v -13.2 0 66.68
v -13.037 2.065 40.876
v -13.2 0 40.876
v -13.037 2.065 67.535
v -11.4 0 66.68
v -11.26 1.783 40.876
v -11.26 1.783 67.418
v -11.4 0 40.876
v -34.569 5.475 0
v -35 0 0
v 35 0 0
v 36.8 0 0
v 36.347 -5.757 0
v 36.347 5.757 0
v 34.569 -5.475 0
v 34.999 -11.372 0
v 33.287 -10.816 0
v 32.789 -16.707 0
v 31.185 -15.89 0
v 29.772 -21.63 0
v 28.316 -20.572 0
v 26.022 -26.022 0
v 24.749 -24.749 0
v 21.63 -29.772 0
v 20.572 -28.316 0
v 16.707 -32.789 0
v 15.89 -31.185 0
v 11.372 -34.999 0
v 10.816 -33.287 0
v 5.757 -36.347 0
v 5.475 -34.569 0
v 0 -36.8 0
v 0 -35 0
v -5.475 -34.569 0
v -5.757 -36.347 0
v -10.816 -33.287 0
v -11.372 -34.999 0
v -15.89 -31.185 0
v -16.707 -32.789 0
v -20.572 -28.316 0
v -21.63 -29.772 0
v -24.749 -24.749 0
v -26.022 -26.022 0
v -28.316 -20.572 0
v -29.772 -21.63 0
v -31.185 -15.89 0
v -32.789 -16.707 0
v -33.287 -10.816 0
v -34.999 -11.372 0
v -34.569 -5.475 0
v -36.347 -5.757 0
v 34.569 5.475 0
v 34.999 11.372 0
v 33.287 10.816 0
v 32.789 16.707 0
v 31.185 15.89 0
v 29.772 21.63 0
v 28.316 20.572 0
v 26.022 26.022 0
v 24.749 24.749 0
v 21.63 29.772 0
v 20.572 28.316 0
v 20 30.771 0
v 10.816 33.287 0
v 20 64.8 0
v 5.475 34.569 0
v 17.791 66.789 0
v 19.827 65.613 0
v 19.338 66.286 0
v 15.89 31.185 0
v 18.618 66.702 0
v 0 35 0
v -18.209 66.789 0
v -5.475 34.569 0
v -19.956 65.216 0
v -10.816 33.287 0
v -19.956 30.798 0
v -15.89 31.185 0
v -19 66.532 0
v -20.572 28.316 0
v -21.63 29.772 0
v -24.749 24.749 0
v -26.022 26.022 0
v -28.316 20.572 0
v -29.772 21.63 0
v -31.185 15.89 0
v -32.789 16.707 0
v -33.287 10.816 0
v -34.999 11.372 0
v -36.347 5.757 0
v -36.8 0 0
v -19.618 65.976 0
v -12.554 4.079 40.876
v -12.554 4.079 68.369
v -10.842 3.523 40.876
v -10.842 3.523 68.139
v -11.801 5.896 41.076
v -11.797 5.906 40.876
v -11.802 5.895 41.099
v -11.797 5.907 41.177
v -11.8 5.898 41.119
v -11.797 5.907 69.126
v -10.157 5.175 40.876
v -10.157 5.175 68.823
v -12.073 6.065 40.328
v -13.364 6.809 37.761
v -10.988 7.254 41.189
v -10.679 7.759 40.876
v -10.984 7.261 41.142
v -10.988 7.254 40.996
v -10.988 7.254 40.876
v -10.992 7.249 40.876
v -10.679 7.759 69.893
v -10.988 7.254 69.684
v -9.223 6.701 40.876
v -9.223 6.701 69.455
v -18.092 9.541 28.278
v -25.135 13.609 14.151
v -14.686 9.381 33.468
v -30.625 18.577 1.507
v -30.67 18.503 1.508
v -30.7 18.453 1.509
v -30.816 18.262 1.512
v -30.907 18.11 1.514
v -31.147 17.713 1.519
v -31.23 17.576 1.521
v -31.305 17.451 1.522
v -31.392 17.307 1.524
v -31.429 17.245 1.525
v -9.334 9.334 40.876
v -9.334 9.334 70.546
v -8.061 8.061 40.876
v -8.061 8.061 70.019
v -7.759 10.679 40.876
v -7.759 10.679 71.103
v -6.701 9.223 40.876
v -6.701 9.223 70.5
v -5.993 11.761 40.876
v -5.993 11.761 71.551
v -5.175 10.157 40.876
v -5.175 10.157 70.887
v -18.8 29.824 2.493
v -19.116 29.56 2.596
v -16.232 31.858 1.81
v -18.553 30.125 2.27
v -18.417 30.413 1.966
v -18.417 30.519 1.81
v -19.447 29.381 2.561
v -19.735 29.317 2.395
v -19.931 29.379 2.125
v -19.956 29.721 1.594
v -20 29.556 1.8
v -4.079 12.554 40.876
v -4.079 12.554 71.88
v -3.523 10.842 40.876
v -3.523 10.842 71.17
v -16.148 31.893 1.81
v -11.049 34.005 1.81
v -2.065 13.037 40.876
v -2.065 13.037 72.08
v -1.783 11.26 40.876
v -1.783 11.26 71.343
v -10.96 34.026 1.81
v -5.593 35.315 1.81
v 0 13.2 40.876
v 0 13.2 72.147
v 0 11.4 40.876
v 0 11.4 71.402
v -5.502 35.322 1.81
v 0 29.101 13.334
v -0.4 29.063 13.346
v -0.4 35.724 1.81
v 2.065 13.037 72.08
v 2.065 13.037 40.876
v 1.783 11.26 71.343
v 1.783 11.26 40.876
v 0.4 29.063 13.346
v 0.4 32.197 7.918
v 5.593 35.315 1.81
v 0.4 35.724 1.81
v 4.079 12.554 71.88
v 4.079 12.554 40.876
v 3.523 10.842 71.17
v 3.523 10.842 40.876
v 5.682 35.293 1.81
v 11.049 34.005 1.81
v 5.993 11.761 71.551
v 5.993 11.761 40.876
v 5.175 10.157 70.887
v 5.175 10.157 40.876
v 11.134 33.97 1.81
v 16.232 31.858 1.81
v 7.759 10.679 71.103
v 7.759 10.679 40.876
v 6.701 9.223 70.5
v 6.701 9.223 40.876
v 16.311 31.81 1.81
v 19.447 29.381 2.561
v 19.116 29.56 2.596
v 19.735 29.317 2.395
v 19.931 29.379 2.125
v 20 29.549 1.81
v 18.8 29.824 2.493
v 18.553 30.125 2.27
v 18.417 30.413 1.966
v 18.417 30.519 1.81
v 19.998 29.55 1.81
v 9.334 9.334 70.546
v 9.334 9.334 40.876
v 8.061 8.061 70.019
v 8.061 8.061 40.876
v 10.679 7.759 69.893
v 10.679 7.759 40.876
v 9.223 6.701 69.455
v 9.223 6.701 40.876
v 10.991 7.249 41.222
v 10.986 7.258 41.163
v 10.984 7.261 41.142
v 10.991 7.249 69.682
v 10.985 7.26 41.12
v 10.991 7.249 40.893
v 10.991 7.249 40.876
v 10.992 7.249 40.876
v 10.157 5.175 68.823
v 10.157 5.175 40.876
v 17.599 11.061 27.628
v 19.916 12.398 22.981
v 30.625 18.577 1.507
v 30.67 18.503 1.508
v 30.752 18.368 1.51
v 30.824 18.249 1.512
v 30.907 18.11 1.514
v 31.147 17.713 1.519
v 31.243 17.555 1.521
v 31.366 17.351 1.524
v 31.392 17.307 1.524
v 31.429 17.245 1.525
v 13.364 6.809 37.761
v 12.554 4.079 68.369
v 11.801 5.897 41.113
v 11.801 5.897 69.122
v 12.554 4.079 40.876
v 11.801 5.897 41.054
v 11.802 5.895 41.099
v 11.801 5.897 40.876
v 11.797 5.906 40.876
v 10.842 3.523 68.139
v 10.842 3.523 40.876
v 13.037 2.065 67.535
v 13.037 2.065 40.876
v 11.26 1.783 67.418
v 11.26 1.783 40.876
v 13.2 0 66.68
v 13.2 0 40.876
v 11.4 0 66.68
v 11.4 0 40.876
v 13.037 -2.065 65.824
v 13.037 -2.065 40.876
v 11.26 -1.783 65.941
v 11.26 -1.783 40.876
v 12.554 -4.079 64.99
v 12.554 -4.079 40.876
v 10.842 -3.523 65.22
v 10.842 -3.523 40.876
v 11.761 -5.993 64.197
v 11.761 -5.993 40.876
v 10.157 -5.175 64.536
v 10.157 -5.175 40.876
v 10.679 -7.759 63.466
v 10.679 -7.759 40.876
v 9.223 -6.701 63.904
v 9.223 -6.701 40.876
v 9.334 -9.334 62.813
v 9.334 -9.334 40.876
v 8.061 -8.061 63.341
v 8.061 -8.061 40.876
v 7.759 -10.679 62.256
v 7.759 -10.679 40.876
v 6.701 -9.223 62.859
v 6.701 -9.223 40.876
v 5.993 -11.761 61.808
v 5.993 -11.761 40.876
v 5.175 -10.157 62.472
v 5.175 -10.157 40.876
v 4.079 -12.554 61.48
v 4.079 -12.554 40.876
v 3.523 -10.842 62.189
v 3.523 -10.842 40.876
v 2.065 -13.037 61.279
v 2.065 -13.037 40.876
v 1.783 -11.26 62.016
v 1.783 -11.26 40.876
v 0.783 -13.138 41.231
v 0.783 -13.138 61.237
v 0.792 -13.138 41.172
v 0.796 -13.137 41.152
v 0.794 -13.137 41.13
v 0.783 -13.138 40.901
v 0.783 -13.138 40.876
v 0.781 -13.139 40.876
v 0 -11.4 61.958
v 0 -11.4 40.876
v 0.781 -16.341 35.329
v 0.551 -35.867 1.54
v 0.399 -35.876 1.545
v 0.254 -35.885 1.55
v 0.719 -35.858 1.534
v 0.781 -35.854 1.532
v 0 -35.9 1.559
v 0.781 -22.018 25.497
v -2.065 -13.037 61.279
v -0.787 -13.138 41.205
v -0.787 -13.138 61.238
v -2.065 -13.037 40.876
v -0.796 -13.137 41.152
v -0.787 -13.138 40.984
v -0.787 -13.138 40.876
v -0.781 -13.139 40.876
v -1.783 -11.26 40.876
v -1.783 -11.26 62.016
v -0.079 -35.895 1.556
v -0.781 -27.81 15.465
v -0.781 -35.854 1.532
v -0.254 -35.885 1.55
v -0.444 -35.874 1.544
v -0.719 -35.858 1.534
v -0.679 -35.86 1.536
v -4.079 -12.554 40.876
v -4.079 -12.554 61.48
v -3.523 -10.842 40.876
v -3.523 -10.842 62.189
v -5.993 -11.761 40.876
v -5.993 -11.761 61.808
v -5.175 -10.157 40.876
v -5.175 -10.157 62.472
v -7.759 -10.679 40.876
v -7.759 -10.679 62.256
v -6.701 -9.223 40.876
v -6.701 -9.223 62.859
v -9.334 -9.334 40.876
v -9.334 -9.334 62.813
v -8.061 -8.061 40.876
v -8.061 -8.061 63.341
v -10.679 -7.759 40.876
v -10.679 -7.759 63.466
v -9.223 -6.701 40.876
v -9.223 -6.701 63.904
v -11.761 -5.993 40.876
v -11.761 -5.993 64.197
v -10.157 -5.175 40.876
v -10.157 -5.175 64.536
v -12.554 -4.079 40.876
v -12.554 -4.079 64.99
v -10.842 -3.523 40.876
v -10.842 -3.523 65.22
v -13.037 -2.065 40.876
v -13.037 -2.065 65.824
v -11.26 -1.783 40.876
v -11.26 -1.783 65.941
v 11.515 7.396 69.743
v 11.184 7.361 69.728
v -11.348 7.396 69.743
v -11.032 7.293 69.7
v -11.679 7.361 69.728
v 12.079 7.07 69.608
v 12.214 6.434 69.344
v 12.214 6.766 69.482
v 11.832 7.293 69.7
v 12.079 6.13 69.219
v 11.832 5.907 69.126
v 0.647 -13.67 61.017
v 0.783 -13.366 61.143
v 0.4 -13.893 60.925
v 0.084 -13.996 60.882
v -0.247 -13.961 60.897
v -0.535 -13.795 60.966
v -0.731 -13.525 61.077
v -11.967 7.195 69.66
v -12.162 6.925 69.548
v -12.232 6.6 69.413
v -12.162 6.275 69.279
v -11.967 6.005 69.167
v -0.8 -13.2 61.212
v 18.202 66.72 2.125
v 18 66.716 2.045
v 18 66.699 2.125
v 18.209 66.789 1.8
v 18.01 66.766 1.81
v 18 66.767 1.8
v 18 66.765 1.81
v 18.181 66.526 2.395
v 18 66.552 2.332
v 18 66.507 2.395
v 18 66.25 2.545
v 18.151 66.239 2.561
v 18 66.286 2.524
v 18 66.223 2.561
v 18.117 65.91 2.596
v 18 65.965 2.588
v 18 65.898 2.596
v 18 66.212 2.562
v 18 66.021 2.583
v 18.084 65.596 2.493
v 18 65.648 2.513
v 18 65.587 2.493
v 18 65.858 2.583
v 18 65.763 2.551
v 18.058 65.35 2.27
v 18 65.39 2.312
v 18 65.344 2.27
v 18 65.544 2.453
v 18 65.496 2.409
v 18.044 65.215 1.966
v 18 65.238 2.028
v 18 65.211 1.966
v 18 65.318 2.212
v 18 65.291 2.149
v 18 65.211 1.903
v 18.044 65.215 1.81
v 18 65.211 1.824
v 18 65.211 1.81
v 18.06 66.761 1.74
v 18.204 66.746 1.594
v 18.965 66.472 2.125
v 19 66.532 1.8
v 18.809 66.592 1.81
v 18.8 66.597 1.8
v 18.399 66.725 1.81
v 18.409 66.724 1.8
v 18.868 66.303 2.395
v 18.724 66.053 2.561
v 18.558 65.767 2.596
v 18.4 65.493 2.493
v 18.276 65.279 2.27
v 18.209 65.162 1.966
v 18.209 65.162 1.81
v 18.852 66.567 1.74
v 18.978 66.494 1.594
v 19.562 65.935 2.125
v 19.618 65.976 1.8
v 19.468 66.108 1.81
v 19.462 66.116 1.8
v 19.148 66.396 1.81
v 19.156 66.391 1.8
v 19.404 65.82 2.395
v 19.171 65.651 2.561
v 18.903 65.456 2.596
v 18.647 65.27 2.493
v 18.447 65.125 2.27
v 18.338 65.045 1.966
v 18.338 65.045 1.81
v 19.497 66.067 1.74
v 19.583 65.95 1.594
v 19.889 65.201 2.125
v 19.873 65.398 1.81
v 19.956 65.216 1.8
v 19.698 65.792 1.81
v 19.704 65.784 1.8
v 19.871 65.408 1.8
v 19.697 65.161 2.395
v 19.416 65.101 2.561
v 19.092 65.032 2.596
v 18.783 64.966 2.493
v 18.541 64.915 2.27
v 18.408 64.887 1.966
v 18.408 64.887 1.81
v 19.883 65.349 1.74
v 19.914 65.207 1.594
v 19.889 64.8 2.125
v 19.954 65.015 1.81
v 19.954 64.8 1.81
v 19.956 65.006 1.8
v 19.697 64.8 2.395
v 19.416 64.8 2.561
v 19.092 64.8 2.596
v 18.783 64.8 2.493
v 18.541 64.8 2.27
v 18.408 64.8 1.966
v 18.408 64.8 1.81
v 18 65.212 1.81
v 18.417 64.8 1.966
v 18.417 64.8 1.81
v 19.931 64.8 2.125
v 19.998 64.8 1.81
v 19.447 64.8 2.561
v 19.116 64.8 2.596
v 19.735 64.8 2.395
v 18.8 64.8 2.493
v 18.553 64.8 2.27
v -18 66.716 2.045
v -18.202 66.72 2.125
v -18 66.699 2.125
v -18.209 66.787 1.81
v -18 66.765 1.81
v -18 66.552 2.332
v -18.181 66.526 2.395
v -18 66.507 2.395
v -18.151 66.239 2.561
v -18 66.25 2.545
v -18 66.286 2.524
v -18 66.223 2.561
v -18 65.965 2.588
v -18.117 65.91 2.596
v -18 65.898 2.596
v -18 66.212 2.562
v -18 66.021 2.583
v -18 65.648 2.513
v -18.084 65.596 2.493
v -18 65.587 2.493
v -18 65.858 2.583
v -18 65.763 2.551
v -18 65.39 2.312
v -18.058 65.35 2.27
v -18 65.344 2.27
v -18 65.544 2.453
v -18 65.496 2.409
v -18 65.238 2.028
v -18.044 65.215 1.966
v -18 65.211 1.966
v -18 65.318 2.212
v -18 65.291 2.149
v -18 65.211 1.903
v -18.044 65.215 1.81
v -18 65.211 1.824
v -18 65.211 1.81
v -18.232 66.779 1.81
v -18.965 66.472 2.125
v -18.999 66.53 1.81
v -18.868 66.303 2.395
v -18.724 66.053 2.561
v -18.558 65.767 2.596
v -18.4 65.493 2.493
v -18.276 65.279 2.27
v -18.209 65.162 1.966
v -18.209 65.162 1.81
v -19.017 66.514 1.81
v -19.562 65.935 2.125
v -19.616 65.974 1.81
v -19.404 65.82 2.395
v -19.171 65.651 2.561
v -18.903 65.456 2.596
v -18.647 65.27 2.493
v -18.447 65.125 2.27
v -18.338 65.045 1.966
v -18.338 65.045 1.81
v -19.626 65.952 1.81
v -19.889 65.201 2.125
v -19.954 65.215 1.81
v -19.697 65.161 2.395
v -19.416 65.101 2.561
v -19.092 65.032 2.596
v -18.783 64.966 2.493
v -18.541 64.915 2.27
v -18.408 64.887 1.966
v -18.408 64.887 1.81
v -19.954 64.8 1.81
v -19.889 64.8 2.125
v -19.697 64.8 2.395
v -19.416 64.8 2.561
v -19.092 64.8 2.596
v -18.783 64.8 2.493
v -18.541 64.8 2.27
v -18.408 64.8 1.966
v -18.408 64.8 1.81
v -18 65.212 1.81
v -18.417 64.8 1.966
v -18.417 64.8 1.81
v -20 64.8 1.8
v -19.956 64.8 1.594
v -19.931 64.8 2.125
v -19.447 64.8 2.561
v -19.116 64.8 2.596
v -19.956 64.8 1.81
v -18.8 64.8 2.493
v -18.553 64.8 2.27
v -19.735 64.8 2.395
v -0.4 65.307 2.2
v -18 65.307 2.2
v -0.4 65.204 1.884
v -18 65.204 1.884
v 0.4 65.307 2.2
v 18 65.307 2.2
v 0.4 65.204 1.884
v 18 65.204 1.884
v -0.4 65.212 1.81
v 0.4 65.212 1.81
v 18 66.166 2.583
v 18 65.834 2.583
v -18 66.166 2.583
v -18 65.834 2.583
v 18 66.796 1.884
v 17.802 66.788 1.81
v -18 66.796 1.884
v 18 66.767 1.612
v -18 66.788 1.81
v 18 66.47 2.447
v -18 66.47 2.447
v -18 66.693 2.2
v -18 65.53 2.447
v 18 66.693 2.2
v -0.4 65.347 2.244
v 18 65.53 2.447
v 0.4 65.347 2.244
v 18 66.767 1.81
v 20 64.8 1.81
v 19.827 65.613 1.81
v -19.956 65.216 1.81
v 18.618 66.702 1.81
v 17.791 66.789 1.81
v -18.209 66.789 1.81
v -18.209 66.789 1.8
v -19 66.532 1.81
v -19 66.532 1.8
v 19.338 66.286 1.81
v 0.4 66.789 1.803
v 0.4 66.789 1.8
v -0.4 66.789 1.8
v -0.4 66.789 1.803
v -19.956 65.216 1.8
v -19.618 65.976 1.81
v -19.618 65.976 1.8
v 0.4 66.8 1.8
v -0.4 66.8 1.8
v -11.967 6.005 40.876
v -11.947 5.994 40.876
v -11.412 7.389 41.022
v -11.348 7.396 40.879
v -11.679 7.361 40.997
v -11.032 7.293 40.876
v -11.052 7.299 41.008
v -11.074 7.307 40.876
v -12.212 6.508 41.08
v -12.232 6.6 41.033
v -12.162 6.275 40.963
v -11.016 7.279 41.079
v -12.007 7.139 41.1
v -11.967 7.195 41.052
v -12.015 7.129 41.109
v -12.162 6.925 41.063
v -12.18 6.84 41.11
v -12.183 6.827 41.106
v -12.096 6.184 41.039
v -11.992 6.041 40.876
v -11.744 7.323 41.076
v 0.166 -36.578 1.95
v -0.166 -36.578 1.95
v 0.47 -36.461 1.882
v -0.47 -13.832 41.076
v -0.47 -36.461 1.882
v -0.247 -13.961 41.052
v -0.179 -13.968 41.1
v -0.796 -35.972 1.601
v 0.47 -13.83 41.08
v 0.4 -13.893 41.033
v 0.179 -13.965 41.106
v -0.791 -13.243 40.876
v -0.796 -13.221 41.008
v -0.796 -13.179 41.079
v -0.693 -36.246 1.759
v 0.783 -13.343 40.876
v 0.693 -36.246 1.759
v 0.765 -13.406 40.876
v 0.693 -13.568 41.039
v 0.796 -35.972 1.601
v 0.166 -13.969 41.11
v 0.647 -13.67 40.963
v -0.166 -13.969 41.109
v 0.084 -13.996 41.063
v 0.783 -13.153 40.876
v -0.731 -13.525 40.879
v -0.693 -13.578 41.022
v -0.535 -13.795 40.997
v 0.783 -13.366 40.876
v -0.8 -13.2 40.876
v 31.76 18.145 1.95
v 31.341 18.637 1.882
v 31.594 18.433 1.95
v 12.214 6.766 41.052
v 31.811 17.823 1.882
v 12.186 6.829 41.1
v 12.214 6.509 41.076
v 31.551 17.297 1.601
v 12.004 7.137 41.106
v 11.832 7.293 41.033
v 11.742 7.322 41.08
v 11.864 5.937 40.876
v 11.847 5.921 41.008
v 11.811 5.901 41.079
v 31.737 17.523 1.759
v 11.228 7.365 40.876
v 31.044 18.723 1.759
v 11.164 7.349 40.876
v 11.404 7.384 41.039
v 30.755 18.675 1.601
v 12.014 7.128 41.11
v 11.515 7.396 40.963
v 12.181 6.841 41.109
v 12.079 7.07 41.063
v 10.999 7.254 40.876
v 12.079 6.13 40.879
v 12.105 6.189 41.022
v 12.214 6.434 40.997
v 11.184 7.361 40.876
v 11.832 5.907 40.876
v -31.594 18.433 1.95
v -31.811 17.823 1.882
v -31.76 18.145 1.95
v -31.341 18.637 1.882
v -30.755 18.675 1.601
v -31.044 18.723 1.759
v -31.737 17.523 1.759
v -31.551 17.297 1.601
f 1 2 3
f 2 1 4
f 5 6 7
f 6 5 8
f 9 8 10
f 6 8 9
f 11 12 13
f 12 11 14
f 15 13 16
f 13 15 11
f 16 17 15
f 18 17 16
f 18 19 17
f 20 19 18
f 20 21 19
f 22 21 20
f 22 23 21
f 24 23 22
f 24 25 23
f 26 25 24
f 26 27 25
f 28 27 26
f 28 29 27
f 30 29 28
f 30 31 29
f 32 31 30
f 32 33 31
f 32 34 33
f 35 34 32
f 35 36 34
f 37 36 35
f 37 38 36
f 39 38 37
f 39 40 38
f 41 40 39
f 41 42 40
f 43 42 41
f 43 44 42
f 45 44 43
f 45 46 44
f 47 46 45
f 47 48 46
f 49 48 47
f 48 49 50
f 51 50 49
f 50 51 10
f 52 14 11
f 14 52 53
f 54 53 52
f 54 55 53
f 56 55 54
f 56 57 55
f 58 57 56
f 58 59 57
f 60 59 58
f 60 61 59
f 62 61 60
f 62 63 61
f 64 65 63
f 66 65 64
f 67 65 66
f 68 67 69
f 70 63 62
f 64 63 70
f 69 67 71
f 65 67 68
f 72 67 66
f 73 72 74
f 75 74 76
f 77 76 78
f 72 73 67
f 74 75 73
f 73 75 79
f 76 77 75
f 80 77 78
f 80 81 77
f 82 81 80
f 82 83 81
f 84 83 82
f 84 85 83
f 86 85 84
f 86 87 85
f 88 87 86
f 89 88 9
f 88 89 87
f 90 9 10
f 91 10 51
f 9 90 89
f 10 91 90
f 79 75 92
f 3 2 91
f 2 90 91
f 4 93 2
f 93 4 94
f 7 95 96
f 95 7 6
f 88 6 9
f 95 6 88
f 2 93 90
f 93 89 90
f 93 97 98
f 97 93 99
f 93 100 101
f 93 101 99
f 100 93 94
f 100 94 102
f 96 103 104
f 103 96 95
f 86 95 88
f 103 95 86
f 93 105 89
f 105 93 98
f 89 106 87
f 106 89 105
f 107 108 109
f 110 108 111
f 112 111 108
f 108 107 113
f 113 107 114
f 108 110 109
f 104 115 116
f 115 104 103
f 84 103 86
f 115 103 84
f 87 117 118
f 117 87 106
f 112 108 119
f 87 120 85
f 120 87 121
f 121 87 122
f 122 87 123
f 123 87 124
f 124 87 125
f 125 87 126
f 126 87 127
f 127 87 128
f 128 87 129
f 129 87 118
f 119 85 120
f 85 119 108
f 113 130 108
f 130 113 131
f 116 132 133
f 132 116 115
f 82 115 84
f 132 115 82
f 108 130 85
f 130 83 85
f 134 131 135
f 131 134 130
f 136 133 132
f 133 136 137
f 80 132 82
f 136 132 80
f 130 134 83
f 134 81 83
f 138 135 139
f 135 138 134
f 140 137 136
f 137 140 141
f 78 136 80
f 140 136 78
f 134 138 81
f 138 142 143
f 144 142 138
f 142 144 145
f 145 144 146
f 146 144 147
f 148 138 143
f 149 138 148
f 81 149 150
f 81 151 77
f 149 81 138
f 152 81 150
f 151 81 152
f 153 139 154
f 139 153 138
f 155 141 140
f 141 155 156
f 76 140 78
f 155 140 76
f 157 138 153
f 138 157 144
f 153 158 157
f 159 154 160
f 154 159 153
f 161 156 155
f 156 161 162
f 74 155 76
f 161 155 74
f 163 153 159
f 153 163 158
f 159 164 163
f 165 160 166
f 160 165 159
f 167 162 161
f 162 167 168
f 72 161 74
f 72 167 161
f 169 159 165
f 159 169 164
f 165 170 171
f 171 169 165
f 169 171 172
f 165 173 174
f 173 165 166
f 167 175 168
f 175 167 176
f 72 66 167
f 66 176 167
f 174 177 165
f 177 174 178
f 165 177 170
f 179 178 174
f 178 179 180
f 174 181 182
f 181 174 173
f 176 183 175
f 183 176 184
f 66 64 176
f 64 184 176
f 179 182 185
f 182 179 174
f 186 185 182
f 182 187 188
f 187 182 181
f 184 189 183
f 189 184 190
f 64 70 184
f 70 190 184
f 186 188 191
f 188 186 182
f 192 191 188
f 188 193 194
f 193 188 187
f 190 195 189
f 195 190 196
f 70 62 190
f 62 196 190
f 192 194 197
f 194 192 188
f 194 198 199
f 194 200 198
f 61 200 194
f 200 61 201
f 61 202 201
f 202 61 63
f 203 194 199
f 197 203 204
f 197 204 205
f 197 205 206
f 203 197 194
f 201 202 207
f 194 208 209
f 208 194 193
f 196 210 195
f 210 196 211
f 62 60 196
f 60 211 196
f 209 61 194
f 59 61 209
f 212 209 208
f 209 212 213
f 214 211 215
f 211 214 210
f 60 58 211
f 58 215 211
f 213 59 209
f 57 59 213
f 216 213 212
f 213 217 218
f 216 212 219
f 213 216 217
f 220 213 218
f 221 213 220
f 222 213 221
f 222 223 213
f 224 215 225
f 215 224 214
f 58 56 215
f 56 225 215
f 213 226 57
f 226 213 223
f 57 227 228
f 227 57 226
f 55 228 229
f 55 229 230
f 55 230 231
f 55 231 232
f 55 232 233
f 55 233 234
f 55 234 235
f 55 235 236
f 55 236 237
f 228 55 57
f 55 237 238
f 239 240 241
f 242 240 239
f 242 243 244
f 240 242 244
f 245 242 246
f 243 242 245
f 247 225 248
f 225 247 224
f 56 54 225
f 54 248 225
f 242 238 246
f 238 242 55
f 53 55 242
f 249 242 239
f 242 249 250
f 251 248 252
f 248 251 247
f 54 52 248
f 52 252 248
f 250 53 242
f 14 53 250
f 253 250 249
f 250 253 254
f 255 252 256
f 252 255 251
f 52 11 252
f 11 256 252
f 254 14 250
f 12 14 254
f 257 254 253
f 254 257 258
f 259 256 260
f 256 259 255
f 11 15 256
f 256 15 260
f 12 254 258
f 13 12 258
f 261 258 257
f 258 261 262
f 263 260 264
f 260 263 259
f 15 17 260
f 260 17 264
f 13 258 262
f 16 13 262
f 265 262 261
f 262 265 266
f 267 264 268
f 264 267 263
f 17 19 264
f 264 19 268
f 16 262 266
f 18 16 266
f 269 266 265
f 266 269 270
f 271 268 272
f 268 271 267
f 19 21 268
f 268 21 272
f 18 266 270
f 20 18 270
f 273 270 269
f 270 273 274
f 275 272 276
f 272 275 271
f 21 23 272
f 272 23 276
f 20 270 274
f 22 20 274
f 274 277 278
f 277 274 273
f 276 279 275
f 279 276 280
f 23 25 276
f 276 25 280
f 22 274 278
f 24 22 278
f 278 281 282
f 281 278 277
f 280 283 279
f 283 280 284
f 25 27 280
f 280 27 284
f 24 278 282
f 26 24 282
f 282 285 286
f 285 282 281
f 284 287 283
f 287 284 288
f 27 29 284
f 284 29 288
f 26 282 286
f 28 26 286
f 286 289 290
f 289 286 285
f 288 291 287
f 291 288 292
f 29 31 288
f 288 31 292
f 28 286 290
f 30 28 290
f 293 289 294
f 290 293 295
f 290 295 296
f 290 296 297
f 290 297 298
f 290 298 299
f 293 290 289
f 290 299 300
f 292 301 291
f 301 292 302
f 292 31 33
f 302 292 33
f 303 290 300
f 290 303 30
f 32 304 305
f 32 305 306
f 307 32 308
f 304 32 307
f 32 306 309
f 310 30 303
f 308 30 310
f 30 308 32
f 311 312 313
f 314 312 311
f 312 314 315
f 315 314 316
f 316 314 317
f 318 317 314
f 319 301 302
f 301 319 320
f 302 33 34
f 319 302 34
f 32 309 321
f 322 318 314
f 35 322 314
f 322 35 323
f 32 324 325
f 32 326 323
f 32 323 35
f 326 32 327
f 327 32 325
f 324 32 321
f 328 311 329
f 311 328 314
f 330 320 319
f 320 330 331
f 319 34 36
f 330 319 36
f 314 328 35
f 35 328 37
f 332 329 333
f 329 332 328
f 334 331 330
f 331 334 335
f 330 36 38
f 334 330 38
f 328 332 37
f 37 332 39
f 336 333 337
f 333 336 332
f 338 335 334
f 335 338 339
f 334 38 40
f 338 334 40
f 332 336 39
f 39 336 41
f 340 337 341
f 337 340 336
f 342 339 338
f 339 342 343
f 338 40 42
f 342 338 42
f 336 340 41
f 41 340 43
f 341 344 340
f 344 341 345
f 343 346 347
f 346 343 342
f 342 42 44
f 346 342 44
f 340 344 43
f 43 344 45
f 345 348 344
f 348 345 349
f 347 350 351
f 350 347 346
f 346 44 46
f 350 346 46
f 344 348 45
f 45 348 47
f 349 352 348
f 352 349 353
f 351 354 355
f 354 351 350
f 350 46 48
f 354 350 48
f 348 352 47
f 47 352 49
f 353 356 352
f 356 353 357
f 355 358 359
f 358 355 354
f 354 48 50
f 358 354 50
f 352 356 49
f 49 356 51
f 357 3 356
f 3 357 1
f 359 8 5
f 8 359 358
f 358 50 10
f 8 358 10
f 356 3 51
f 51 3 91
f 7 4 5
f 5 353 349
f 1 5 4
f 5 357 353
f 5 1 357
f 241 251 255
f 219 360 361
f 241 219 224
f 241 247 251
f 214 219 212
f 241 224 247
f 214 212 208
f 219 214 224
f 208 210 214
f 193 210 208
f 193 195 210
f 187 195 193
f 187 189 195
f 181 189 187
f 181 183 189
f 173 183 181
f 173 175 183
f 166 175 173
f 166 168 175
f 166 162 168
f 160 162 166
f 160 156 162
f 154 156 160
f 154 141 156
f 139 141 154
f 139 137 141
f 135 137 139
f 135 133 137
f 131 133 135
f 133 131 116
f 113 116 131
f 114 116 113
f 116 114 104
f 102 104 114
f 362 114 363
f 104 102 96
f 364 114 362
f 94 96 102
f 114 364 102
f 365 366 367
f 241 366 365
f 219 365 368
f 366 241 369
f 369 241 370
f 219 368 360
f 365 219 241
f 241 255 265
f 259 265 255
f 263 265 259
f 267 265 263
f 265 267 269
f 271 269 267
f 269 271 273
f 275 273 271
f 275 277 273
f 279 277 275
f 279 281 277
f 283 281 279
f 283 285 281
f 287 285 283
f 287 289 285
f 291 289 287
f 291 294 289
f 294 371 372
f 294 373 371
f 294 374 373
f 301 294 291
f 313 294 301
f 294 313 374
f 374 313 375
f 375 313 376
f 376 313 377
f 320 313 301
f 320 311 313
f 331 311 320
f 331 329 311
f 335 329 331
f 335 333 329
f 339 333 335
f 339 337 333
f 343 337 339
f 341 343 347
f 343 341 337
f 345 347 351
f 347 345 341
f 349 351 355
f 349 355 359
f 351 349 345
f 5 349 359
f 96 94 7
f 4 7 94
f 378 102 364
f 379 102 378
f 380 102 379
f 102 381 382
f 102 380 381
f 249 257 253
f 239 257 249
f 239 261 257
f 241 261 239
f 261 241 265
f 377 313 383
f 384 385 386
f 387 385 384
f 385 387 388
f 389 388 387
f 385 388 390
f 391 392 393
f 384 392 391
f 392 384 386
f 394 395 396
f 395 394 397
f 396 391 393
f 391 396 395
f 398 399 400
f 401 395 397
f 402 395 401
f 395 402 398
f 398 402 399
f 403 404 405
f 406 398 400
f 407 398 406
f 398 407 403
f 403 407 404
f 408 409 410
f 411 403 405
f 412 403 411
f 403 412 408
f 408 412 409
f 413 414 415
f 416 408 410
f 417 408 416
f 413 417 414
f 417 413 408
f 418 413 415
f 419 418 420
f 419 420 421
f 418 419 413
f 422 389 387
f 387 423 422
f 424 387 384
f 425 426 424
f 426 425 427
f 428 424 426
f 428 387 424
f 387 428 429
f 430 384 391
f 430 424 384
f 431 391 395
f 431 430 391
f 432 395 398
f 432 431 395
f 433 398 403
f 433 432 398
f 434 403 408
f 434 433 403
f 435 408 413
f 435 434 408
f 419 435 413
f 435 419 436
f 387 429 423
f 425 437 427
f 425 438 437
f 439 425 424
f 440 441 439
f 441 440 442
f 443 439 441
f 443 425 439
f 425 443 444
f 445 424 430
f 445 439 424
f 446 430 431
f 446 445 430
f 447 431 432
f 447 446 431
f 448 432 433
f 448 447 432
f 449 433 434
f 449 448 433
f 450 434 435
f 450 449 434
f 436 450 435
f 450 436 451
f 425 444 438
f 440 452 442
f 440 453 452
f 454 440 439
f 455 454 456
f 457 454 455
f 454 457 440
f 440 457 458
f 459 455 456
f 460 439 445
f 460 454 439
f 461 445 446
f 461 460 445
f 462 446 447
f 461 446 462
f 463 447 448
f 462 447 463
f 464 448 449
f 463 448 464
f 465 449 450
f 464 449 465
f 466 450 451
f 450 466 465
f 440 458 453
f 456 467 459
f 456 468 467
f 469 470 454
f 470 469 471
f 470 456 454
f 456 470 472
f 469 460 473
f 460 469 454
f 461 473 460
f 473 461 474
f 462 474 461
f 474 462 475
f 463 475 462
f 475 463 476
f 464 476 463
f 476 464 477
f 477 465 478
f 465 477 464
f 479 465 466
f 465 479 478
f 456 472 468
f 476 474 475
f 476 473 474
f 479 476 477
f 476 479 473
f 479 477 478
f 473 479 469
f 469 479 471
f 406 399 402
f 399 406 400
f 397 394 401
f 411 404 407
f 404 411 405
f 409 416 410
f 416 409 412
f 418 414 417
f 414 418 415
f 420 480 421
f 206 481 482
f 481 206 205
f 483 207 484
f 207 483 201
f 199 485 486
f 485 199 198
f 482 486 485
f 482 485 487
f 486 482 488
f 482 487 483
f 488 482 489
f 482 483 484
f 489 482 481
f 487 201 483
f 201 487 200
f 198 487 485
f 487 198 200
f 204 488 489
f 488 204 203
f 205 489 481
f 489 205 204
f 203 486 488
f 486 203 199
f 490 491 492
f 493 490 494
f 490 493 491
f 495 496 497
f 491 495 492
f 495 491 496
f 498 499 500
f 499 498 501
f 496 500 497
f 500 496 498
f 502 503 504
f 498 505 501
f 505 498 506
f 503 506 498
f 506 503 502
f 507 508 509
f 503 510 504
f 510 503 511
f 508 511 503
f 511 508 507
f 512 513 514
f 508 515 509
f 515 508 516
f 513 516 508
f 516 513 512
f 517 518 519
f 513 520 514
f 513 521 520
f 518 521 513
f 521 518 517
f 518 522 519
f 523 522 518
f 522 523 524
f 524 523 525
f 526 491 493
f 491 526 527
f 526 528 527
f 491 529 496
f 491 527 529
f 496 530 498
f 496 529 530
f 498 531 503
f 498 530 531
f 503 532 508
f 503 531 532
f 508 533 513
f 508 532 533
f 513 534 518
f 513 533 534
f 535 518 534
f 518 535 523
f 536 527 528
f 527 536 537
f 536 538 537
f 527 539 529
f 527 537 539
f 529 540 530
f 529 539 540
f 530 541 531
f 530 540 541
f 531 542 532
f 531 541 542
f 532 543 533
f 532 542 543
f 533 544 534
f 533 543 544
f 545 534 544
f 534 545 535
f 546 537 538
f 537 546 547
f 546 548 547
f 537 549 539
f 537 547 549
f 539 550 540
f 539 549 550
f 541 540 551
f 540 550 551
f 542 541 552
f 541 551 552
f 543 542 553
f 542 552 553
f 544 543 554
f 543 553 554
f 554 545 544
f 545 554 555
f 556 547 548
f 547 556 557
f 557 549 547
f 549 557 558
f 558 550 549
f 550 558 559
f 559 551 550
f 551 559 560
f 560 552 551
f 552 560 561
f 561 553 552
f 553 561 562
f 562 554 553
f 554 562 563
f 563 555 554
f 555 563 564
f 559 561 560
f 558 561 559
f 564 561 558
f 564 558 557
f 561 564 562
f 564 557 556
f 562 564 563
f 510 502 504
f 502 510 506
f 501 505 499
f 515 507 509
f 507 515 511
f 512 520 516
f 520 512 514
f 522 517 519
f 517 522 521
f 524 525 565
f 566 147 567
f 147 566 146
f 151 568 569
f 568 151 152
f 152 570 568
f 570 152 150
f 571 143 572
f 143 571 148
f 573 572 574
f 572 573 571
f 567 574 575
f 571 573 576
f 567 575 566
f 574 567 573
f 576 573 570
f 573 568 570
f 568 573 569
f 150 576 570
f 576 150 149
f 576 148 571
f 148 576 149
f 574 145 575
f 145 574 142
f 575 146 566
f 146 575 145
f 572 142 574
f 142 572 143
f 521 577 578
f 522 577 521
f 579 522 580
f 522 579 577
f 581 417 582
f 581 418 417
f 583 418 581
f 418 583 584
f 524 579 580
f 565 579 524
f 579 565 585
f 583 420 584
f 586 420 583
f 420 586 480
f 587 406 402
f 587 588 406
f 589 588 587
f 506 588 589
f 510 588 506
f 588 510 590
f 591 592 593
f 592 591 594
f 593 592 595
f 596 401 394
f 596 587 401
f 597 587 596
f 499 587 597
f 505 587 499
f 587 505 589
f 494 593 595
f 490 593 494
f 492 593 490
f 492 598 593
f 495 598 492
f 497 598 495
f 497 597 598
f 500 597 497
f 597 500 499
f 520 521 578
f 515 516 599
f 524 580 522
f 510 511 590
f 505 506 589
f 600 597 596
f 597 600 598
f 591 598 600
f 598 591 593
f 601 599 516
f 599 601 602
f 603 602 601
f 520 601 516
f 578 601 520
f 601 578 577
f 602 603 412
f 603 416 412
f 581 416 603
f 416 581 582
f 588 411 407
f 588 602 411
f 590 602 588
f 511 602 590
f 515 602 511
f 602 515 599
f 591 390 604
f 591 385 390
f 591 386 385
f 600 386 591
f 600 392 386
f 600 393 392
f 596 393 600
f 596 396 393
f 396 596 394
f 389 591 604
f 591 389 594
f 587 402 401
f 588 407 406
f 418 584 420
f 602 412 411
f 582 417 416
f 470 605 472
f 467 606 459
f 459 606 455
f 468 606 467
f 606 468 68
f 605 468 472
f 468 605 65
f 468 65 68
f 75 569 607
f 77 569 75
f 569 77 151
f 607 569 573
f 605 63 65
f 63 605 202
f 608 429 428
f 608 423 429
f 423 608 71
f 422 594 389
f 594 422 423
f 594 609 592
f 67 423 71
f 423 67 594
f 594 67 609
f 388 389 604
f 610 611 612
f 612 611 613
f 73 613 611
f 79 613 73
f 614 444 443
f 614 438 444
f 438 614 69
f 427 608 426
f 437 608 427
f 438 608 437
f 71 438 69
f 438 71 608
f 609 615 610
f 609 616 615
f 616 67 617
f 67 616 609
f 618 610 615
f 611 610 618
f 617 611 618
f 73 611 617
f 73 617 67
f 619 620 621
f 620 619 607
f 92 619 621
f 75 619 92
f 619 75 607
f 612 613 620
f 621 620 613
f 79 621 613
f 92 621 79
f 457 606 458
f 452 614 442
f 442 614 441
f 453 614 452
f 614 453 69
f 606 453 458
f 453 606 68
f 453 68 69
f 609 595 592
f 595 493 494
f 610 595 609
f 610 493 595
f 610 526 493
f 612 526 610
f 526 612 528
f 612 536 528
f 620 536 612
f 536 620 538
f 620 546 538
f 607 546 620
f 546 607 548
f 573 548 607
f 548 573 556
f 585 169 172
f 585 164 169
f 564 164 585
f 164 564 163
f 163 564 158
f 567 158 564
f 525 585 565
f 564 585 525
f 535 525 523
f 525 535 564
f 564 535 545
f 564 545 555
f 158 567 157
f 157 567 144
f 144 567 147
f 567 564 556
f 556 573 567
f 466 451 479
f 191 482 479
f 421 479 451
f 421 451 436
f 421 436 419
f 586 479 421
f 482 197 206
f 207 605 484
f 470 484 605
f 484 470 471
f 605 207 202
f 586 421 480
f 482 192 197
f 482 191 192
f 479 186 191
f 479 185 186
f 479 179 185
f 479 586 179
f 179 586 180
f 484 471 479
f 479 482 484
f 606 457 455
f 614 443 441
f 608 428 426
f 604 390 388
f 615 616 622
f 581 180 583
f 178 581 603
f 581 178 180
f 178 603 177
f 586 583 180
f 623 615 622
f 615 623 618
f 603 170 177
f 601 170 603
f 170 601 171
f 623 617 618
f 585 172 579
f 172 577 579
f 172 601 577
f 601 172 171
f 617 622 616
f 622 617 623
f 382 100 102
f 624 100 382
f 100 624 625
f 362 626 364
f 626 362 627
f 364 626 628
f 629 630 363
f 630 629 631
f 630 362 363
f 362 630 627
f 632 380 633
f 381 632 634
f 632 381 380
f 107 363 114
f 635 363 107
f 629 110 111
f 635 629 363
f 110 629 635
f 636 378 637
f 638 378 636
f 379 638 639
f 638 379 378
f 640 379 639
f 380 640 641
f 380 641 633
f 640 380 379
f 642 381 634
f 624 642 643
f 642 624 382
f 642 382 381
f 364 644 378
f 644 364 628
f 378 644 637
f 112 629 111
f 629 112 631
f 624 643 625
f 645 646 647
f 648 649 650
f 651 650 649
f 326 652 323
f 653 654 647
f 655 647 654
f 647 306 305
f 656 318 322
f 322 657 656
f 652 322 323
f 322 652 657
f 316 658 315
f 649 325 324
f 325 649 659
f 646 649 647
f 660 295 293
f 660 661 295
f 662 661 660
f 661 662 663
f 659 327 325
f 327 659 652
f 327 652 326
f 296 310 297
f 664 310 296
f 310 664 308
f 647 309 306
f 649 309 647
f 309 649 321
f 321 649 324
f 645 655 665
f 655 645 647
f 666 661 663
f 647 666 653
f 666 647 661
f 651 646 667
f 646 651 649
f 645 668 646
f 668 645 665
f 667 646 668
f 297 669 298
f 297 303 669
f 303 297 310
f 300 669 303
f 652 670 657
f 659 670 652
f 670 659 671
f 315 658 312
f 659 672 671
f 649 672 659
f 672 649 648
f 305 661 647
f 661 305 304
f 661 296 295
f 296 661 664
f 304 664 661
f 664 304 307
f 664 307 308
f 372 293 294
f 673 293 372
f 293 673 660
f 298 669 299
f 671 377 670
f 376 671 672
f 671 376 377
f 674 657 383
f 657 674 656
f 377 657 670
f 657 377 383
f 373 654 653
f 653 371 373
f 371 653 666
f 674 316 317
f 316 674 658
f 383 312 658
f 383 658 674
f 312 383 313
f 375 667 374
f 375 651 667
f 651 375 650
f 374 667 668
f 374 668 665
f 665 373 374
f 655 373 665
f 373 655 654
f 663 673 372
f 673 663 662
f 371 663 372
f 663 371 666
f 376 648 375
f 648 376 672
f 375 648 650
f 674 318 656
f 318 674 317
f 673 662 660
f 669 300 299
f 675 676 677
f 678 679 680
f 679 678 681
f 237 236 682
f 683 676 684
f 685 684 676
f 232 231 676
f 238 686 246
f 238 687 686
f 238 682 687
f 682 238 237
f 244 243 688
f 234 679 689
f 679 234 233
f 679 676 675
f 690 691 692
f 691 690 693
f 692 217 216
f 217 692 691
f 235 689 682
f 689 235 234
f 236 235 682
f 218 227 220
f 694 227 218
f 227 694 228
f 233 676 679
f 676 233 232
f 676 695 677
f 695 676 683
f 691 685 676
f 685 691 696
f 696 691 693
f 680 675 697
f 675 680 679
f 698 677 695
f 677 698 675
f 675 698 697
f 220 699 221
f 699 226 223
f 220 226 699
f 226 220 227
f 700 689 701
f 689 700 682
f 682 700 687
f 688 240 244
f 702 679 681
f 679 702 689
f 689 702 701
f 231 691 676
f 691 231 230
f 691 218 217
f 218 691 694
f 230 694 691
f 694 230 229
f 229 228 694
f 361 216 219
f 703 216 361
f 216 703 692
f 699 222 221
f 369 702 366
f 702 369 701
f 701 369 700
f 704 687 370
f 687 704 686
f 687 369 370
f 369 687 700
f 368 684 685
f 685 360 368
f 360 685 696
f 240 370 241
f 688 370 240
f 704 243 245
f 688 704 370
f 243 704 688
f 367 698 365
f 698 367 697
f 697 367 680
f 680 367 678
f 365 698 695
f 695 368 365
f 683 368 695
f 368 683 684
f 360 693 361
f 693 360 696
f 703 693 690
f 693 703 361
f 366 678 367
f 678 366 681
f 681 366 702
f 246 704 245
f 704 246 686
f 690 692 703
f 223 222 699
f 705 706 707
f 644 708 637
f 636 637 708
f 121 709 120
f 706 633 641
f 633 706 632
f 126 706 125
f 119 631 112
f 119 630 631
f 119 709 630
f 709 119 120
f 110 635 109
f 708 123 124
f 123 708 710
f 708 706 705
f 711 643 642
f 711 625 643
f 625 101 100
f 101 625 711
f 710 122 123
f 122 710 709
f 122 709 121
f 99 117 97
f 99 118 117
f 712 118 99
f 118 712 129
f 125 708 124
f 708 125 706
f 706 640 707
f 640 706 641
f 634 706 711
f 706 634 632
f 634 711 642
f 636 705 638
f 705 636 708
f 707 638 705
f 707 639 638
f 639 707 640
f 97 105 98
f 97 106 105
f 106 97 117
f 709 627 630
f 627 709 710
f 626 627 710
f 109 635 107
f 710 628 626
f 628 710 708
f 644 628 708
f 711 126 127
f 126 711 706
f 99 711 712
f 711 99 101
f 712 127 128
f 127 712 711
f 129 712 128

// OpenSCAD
// -*- mode: SCAD ; c-file-style: "ellemtel" ; coding: utf-8 -*-
//
// Parametric funnel with stand
//
// Copyright 2017 -- 2018 Roland Sieker <ospalh@gmail.com>
// Licence: CC-BY-SA 4.0
//

// ... to preview. You will get both parts, if you select a stand
part = "funnel"; // [funnel: funnel, stand: stand or nothing]

// in cm. The neck is the thin bottom part
outer_neck_diameter = 2.8;  // [0.3:0.1:8]

// in cm. This is the top part
inner_rim_diameter = 7;  // [3:0.1:15]

// in cm. The sharped tip is added to this length
neck_length = 2; // [0.3:0.1:8]

// Slope of the main conical part, in degrees. Beware of printing problems with low angles
funnel_angle = 60;  // [30:75]

// Cut off angle to give the funnel a sharpened tip. 0 means flat bottom.
neck_tip_angle = 22.5;  // [0:0.5:60]

// Create just the funnel, or a stand to go with it, with one or three supports
stand_style = 0;  // [0:Just funnel, 1:Funnel and simple stand, 3:Funnel and tripod stand]

// Height added  to the stand, in cm. The height of the top of the funnel will be the length of your pencil plus this.
extra_height = 1; // [1:15]

// Set this to "render" and click on "Create Thing" when done with the setup.
preview = 1; // [0:render, 1:preview]

/* [Hidden] */

// Some of the values below can be carefully tweaked, changing others is a
// bad idea. Try, and undo if it didn't work.


// w = 1.6;
w = 1.8;  // To get four perimeters in slic3r, we have to add a bit here. WTF?
// Wall thickness.  When you measure the conical part along the surfaces it
// will appear thinner.

es_h = 20; // Extra support/stabilizer height
es_w = 0.8;
// Extra support/stabilizer width. Need not be as stable as a normal
// wall

function strake_r() = (stand_style) ? 0 : 0.8;
handle_br = 0.8;  // Hanle border radius


r_n = (outer_neck_diameter * 5) - w -strake_r();  // inner neck radius in mm
r_r = inner_rim_diameter * 5;  // inner rim radius in mm
l_n = neck_length * 10;  // neck_length in mm
heh = extra_height * 5; // Half the extra height, in mm
ond = outer_neck_diameter * 10;
ncl = ond / cos(neck_tip_angle) * 1.05;
nth = ond * tan(neck_tip_angle);

ms = 0.01; // Muggeseggele

fua = funnel_angle;
fua_b = 90 - fua;





wiggle_room_factor = 1.1;

// The small radius of the support pencil, from center to center of face
r_p_s = 3.4 * wiggle_room_factor;
// The flat-to-flat diameter of a standard pencil is 6.8 mm. Do quite a
// bit more.
// The max. radius (center to edge).  Also the
// width of one pencil face.
r_p_l = r_p_s * 2 / 3 * sqrt(3);


// Handle sizes:

handle_w = 40;  // Wide eonugh for index and middle finger
handle_l = 30;  // Long enough for the distal segments
handle_cr = 2;  // Corner radius
// Border radius: see below
handle_handle_ch_ratio = 0.5;
// Used to calculate how heigh the lug that holds the handle is

// Tip angle
tip_a = 21;  // degrees. Apparently standard in Germany

// tip_a = 19;  // degrees. There is a German "Long Point"" pencil sharpnener
// like this.  There are also rumors that American pencils are pointier than
// German ones.
// tip_a = 24  // Special color pencil sharpener.

// The tip angle is apparently from one side to the other side, not from
// one side to the center line.


// Size of the "big pencil" connector. Twice the area, half of it hollow.
r_bp_s = sqrt(2) * r_p_s;
r_bp_l = r_bp_s * 2 / 3 * sqrt(3);

sp_h = 8 * r_p_s;  // Height of the sharpend pencil cylindrical connector bit
usp_h = 10 * r_p_s;  // Height of the unsharpend pencil connector bit


bp_s_h = r_bp_s / tan(tip_a/2);

// Height of the sleeve at the bottom (as printed) of the "big pencil"
// connector. The length of a pencil tip. (The angle of the outer wall
// should come out slightly below tip_a, as the walls get thinner. We
// (try to) maintain cross section area, not wall strength.)
// Here we need the angle from one side to the center line.


some_distance = 2 * (r_r + w) + 13 * w;

// fn for differently sized objects, for preview or rendering.
pfa = 40;
pfb = 15;
pfc = 15;
rfa = 180;
rfb = 60;
rfc = 20;
function fa() = (preview) ? pfa : rfa;
function fb() = (preview) ? pfb : rfb;
function fc() = (preview) ? pfc : rfc;

// *******************************************************
// End setup



// *******************************************************
// Generate the parts

print_part();
// preview_parts();
// stack_parts();

// I used this cylinder as a modifier to set the infill to higher
// values under the central bit of the portioner sphere, to get less
// sag.
// cylinder(r=0.7*r, h=r,$fn=fa());


module print_part()
{
   if (part == "funnel")
   {
      funnel();
   }
   if (part == "stand" && stand_style)
   {
      stand();
   }
}

module preview_parts()
{
   funnel();
   translate([some_distance, 0, 0])
   {
      if (stand_style)
      {
         stand();
      }
   }
}

module stack_parts()
{
   // intersection()
   {
      color("yellow")
      {
         stand();
      }
      rotate([0,180,0])
      {
         translate([0, 0, -3*l_n])
         {
            color("red")
            {
               funnel();
            }
         }
      }
   }
}

// *******************************************************
// Code for the parts themselves


// And the definitions
module funnel()
{

   ch = (r_r - r_n) / tan(fua_b);
   // Max height. I sort-of designed the funnel the right way up, but
   // want it come out upside down.
   // mh = l_n + o_nl + ch;

   mh = l_n + ch;
   // just the rotationl symmetirc part
   module rot_funnel()
   {
      f_poly = [
         [r_n, mh + nth],
         [r_n+w, mh + nth],
         [r_n+w, mh - l_n],
         [r_r + w, mh-mh],
         [r_r, mh-mh],
         [r_n,  mh - l_n]
         // Mathamatically less pure, but easier to print
         ];
      rotate_extrude(convexity=4, $fn=fa())
      {
         polygon(f_poly);
      }

   }

   // The holow core of the funnel, plus a bit of tollerance. Used as
   // difference later.
   module funnel_core()
   {
      c_poly = [
         [0 ,mh + nth],
         [r_n + w/2 ,mh + nth],
         [r_n + w/2, mh - (l_n)],
         [r_r + w/2, -ms],
         [0, -ms]
         ];
      rotate_extrude(, $fn=fa())
      {
         polygon(c_poly);
      }

   }

   module funnel_neck_cutoff()
   {
      // The bit that creates the slant an the neck
      translate([-ond/2-ms, -ond/2-ms, mh])
      {
         rotate(a=neck_tip_angle, v=[1, 0, 0])
         {
            cube([ond+2*ms, ncl, ncl]);
         }
      }
   }

   module funnel_support()
   {

      // The holder lug. The Poly is bigger than needed, and we
      // subtract a bit later.
      lp_poly = [
         [r_bp_s,r_r + w - 3*w],
         [r_bp_s,r_r + w + 1.5 * r_bp_l],
         [0,r_r + w + 2*r_bp_l],
         [-r_bp_s,r_r + w + 1.5 * r_bp_l],
         [-r_bp_s,r_r + w - 3*w],
         ];
      linear_extrude(w)
      {
         // Holder plate
         polygon(lp_poly);
      }
      // Extra support
      translate([-es_w/2,r_n+w+0.5*(r_bp_l-r_p_l),0])
      {
         cube([es_w,r_r-r_n, es_h]);
      }
      bp_s_f = (r_bp_l) / r_p_l;
      translate([0,r_r+w+r_bp_l, w])
      {
         rotate(30)
         {
            difference()
            {
               cylinder(h=usp_h+heh, r=r_bp_l, $fn=6);
               // Hollow it out
               translate([0,0, heh])
               {
                  cylinder(h=usp_h+1,r=r_p_l, $fn=6);
               }
            }
         }
      }

   }
   r_h_w = handle_w - 2*handle_cr;
   e_h_l = handle_l - 2*handle_cr + r_r+w;
   e_h_l_2 = handle_l + r_r+w;

   module funnel_grip()
   {
      translate([-r_h_w/2, handle_cr, 0])
      {
         minkowski()
         {
            cube([r_h_w, e_h_l, w]);
            cylinder(r=handle_cr, h=ms, $fn=fb());
         }
      }

      rotate([0, -90, 0])
      {
         translate([0,0,-handle_br/2])
         {
            linear_extrude(handle_br)
            {
               polygon([[w,0],[ch*handle_handle_ch_ratio+w,0],[w, e_h_l_2]]);
            }
         }
      }
      translate([0,0,w])
      {
         translate([0,e_h_l_2-handle_br])
         {
            rotate([0,90,0])
            {
               cylinder(h=r_h_w, r=handle_br, center=true, $fn=fc());
            }
         }
         side_cylinder();
         mirror()
         {
            side_cylinder();
         }

      }

   }

   module side_cylinder()
   {
      translate([handle_w/2-handle_br,0,0])
      {
         rotate([-90,0,0])
         {
            cylinder(h=e_h_l+handle_cr, r=handle_br, $fn=fc());
         }
         translate([handle_br-handle_cr, e_h_l_2-handle_cr, 0])
         {
            difference()
            {
               rotate_extrude($fn=fb())
               {
                  translate([handle_cr-handle_br,0])
                  {
                     circle(r=handle_br, $fn=fc());
                  }
               }
               translate([-handle_cr,-2*handle_cr,0])
               {
                  cube([2*handle_cr,2*handle_cr, handle_br]);
               }
               translate([-2*handle_cr,-handle_cr,0])
               {
                  cube([2*handle_cr,2*handle_cr, handle_br]);
               }
            }
         }
      }

   }
   module funnel_strake()
   {

      translate([0, r_n+w, mh-l_n])
      {
         cylinder(r=strake_r(), h=l_n+nth, $fn=fc());
      }
      rotate(30)
      {
         translate([-(r_r+w), 0, 0])
         {
            rotate([0,90-funnel_angle,0])
            {
               translate([0,0,w])
               {
                  // It's possibly a rounding error, but with
                  // r=strake_r here it doesn't perfectly
                  // align with the funnel. Use a bit more.
                  cylinder(r=strake_r(), h=(r_r - r_n) / cos(funnel_angle), $fn=fc());
               }
            }
         }
      }

   }

   // The funnel proper
   difference()
   {
      rot_funnel();
      funnel_neck_cutoff();
   }

   //
   difference()
   {
      union()
      {
         if (stand_style > 0)
         {
            for (sr=[0:120:(stand_style-1)*120])
            {
               rotate(sr)
               {
                  funnel_support();
               }
            }
         }
         else
         {
            funnel_grip();
            for (i=[60, 180, 300])
            {
               rotate(i)
               {
                  funnel_strake();
               }
            }

         }
      }
      funnel_core();
      funnel_neck_cutoff();
   }
}


module stand()
{
   // hex_r = r_r + w + r_p_s;
   hex_r = r_r+ w + r_bp_l;
//   hex_r_l = hex_r_s * 2 / 3 * sqrt(3);
   difference()
   {
      union()
      {
         // Construct the stand ring symmetric to xy plane ...
         rotate(30)
         {
            rotate_extrude($fn=6)
            {
               translate([hex_r, 0, 0])
               {
                  circle(r=r_p_l, $fn=6);
               }
            }
         }
      }
      // and subtract everything below the xy plane.
      translate([0,0,-l_n])
      {
         cylinder(r=1.5*r_r, h=l_n);
      }
   }
   // Fill the base plate
   rotate(30)
   {
      cylinder(r=hex_r, h=es_w, $fn=6);
   }
   for (sr=[0:120:(stand_style-1)*120])
   {
      rotate(sr)
      {
         translate([0, hex_r, 0])
         {
            // The stand.

            rotate(30)
            {
               difference()
               {
                  union()
                  {
                     // Three segments of linear extrusion
                     // The extra
                     cylinder(h=heh, r=r_p_l,$fn=6);
                     // The sharpend bit
                     translate([0, 0 , heh])
                     {
                        cylinder(h=bp_s_h, r1=r_p_l, r2=r_bp_l,$fn=6);
                     }
                     // The shaft bit
                     translate([0, 0 , bp_s_h+heh])
                     {
                        cylinder(h=sp_h, r=r_bp_l, $fn=6);
                     }
                     // The extra plates. Should not interfere with the stand
                     // without this. Anyway.
                     rotate(-60)
                     {
                        extra_plate();
                     }
                     rotate(180)
                     {
                        extra_plate();
                     }
                  }
                  // Hollow it out
                  translate([0, 0 , heh])
                  {
                     cylinder(h=bp_s_h, r1=0, r2=r_p_l, $fn=6);
                  }
                  translate([0, 0 , bp_s_h+heh])
                  {
                     cylinder(h=sp_h+1,r=r_p_l, $fn=6);
                  }

               }
            }
         }

      }
   }

   module extra_plate()
   {
      es_s_p = [
         [0, 0],
         [es_h + r_p_l/2, 0],
         [0, es_h + r_p_l/2]
         ];
      rotate([90, 0, 0])
      {
         translate([r_p_s, 0.5*r_p_l, 0])
         {
            linear_extrude(es_w)
            {
               polygon(es_s_p);
            }
         }
      }
   }
}
